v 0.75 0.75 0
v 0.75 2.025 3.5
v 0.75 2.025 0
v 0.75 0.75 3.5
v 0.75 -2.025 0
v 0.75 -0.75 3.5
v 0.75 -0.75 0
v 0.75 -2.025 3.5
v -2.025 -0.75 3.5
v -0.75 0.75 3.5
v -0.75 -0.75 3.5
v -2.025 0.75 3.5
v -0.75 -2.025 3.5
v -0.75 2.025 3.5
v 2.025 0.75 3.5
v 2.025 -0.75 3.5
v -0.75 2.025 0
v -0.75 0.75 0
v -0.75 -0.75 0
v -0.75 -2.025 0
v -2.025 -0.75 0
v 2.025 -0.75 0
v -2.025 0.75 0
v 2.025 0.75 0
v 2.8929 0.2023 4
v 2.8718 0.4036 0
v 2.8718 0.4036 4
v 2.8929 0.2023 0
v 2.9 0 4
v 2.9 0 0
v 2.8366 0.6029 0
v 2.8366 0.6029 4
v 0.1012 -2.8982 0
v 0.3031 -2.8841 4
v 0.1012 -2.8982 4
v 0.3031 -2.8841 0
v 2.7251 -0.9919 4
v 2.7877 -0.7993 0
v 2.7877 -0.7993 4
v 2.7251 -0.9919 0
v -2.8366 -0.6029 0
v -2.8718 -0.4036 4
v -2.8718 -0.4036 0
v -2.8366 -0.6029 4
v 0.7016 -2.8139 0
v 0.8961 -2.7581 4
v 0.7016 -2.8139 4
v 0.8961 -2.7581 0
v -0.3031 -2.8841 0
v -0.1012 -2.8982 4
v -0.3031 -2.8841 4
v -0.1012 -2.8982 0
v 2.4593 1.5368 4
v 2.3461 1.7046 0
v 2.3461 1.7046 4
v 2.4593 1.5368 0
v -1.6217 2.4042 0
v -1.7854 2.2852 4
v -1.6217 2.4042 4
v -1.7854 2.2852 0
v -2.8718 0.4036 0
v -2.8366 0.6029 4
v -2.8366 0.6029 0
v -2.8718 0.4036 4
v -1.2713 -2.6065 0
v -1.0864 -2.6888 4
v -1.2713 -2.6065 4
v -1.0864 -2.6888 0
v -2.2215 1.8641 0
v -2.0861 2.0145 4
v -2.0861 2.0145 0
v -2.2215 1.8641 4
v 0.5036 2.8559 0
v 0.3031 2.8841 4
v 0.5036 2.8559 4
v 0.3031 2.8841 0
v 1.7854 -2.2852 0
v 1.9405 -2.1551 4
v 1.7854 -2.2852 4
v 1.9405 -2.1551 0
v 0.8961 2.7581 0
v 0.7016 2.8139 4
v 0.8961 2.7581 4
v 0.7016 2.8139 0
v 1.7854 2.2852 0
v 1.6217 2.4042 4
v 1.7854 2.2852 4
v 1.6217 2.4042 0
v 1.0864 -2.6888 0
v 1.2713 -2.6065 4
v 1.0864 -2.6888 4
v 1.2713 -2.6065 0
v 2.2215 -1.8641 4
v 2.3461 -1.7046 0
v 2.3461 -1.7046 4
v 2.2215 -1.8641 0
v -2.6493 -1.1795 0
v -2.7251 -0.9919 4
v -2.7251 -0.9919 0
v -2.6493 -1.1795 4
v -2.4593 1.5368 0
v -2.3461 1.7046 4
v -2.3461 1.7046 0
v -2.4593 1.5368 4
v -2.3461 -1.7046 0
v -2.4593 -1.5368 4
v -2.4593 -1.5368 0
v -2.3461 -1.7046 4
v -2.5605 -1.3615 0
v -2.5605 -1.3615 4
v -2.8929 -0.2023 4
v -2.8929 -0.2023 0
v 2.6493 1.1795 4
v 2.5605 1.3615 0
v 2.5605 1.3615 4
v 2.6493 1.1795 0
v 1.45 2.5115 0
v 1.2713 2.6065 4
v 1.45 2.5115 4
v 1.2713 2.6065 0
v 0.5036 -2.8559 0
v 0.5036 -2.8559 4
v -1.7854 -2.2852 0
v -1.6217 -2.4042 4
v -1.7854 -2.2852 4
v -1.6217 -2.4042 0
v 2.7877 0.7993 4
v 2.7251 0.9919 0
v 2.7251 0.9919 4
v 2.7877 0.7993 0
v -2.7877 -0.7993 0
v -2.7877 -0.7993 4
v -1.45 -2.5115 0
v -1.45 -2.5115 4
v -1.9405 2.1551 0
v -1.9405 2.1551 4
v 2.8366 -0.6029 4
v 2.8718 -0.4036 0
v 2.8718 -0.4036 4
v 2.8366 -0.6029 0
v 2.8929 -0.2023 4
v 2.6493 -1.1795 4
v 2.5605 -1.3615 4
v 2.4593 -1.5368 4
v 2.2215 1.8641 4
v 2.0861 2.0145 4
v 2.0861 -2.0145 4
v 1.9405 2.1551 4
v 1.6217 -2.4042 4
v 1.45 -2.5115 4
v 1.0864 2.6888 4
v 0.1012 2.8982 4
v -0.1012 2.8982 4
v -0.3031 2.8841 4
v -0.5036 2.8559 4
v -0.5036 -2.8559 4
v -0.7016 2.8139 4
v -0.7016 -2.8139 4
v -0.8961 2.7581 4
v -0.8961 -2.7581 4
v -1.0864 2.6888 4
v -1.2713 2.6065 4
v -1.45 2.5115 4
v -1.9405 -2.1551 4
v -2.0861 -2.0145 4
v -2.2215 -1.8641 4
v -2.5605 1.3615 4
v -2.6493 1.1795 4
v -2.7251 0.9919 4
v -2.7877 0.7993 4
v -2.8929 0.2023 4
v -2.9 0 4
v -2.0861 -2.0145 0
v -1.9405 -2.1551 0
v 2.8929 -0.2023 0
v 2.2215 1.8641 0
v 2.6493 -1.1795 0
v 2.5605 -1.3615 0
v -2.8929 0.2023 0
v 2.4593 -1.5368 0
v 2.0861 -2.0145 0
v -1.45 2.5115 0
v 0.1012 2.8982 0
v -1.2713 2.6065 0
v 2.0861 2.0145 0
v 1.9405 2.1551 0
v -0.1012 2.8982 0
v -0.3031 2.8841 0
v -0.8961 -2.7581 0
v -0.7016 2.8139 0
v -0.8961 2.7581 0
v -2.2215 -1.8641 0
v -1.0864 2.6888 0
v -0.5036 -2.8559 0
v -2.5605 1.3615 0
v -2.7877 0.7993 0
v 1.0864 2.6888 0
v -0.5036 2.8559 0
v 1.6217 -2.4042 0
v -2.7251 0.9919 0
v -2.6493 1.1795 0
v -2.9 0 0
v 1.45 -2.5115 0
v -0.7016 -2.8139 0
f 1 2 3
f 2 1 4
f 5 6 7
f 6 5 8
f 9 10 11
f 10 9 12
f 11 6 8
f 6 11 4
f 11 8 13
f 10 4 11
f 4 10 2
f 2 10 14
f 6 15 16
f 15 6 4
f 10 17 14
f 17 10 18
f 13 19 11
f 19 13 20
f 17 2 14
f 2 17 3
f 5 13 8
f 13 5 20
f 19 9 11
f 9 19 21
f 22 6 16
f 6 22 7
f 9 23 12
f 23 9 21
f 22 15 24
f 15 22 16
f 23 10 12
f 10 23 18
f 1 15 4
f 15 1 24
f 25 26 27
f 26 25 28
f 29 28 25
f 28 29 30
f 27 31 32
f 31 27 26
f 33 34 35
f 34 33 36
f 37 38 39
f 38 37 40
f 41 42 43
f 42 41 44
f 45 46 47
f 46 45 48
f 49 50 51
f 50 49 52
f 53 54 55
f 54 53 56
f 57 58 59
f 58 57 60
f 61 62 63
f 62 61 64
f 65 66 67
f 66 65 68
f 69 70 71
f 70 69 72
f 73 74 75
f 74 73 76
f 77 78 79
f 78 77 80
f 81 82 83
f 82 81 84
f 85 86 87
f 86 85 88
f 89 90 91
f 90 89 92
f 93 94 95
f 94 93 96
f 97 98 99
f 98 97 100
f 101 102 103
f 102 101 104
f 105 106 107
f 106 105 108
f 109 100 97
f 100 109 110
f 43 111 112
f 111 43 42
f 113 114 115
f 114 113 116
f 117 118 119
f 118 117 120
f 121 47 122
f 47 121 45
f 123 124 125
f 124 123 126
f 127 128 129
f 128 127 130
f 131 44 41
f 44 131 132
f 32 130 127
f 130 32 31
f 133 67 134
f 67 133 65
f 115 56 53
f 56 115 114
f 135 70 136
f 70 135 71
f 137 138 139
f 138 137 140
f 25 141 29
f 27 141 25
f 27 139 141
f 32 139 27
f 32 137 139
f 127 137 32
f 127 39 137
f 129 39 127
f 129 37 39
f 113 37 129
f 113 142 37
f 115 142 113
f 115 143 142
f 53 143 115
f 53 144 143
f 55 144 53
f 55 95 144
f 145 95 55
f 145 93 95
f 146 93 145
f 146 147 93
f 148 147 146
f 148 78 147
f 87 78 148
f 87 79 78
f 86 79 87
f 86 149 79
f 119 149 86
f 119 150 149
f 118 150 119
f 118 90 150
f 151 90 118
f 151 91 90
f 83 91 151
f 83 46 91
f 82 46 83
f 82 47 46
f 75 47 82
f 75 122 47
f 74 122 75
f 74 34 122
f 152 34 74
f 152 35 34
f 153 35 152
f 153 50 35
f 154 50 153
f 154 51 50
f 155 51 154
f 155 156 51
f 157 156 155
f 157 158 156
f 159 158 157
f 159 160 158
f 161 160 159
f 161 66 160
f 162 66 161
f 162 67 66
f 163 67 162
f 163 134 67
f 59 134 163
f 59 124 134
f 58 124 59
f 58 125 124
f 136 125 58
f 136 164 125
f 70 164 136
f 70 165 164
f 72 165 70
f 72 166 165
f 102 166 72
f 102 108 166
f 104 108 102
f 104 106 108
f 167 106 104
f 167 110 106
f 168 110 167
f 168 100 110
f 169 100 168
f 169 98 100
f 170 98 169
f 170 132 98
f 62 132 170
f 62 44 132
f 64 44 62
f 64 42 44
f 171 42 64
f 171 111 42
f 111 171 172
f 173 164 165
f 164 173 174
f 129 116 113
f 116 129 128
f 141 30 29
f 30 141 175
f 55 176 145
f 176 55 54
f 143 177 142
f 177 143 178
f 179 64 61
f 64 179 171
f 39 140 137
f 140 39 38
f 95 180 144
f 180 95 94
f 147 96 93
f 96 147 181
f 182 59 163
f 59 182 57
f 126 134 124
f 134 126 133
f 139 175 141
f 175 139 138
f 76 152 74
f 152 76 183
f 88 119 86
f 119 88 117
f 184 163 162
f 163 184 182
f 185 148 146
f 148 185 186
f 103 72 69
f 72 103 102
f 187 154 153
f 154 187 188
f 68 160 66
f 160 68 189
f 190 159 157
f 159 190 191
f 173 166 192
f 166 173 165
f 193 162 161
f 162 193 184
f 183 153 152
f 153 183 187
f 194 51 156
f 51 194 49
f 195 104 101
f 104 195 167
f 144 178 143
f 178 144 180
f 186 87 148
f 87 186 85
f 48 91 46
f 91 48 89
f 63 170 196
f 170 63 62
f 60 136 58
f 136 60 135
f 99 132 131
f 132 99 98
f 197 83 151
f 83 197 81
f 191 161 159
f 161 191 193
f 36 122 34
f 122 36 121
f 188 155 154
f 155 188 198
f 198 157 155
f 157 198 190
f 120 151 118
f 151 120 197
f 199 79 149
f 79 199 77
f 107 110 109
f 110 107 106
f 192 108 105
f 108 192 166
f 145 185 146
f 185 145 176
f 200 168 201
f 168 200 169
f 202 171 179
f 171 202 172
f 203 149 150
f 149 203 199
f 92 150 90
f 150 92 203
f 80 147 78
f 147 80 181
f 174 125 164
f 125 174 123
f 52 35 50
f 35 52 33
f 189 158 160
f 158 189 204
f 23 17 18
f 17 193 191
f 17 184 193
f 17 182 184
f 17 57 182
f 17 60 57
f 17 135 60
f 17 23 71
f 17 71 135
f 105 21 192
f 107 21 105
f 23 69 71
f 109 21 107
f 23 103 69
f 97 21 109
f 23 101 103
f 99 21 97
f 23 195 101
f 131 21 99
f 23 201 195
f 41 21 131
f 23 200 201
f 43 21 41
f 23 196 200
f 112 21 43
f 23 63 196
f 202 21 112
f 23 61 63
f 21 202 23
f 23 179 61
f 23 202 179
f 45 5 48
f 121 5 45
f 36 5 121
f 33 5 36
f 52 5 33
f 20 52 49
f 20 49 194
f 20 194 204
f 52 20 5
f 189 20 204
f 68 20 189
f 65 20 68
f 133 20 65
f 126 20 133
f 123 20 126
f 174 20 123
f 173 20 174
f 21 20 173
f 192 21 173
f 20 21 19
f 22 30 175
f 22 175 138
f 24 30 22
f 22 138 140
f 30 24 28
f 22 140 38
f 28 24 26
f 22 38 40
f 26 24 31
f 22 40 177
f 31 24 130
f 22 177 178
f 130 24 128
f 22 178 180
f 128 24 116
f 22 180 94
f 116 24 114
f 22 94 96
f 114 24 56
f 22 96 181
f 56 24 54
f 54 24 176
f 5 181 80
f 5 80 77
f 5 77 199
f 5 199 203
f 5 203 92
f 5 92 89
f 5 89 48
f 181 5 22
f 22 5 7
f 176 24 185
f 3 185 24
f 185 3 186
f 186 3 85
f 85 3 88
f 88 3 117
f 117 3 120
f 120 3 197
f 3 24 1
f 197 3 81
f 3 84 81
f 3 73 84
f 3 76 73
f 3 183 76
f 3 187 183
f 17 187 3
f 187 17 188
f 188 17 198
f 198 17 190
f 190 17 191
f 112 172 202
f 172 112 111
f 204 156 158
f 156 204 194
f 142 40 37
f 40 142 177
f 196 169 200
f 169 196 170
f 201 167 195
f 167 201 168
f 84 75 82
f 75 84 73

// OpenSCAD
difference () {
  translate ([0, 0, 2.0]) {
    cylinder ($fn=90, h=4.0, r=2.9, center=true);
  }
  translate ([0, 0, 1.25]) {
    union () {
      cube ([1.5, 4.05, 4.5], center=true);
      rotate (a=90.0, v=[0, 0, 1]) {
        cube ([1.5, 4.05, 4.5], center=true);
      }
    }
  }
}
